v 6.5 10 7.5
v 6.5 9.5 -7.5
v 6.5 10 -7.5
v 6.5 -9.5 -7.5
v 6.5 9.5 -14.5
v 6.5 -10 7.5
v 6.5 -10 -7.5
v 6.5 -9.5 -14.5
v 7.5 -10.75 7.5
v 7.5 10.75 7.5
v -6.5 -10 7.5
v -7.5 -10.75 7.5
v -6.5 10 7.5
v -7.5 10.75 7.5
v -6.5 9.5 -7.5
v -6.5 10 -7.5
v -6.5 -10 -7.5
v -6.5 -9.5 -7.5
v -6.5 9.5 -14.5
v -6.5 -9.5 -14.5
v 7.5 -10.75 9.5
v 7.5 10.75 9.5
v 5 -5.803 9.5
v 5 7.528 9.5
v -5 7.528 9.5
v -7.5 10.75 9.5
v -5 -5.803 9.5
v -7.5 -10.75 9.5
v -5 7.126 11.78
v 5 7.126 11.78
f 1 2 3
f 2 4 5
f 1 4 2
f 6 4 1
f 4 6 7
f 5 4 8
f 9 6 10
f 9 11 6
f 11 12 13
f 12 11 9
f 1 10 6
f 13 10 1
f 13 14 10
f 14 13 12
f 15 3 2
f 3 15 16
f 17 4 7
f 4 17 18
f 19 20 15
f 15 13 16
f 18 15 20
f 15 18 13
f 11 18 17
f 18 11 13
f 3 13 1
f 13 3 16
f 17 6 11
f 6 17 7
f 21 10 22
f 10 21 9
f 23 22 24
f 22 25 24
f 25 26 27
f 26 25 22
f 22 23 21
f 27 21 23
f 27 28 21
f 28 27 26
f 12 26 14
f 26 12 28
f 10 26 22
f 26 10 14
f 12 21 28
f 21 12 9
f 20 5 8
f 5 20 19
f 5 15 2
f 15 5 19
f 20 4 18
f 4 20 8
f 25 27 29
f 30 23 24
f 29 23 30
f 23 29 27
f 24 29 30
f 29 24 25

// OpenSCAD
// NAME: 12V Power Switch 13x20
// CATEGORY: Electric
// COLOR: 0

module switch(){
    color([0.2, 0.2, 0.2])
        cube([13, 20, 15], center=true);
    translate([0, 0, 8.5])
        color([0.2, 0.2, 0.2])
        cube([15, 21.5, 2], center=true);
    translate([0, 0, -11])
        color([0.2, 0.2, 0.2, 0.5])
        cube([13, 19, 7], center=true);
    translate([0, 0, 9])
        rotate([10, 0, 0])
        color([0, 0, 0.8])
        cube([10, 15, 3], center=true);
}

switch();
